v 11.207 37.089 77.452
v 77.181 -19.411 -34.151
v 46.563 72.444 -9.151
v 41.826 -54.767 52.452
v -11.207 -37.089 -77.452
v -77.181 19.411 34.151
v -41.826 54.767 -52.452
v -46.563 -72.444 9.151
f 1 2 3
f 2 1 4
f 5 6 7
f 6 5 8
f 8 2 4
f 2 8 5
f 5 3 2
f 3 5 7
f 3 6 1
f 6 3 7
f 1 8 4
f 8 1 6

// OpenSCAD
rotate(a=[30.0,60.0,45.0]){cube(size=100.0000,center=true);}
